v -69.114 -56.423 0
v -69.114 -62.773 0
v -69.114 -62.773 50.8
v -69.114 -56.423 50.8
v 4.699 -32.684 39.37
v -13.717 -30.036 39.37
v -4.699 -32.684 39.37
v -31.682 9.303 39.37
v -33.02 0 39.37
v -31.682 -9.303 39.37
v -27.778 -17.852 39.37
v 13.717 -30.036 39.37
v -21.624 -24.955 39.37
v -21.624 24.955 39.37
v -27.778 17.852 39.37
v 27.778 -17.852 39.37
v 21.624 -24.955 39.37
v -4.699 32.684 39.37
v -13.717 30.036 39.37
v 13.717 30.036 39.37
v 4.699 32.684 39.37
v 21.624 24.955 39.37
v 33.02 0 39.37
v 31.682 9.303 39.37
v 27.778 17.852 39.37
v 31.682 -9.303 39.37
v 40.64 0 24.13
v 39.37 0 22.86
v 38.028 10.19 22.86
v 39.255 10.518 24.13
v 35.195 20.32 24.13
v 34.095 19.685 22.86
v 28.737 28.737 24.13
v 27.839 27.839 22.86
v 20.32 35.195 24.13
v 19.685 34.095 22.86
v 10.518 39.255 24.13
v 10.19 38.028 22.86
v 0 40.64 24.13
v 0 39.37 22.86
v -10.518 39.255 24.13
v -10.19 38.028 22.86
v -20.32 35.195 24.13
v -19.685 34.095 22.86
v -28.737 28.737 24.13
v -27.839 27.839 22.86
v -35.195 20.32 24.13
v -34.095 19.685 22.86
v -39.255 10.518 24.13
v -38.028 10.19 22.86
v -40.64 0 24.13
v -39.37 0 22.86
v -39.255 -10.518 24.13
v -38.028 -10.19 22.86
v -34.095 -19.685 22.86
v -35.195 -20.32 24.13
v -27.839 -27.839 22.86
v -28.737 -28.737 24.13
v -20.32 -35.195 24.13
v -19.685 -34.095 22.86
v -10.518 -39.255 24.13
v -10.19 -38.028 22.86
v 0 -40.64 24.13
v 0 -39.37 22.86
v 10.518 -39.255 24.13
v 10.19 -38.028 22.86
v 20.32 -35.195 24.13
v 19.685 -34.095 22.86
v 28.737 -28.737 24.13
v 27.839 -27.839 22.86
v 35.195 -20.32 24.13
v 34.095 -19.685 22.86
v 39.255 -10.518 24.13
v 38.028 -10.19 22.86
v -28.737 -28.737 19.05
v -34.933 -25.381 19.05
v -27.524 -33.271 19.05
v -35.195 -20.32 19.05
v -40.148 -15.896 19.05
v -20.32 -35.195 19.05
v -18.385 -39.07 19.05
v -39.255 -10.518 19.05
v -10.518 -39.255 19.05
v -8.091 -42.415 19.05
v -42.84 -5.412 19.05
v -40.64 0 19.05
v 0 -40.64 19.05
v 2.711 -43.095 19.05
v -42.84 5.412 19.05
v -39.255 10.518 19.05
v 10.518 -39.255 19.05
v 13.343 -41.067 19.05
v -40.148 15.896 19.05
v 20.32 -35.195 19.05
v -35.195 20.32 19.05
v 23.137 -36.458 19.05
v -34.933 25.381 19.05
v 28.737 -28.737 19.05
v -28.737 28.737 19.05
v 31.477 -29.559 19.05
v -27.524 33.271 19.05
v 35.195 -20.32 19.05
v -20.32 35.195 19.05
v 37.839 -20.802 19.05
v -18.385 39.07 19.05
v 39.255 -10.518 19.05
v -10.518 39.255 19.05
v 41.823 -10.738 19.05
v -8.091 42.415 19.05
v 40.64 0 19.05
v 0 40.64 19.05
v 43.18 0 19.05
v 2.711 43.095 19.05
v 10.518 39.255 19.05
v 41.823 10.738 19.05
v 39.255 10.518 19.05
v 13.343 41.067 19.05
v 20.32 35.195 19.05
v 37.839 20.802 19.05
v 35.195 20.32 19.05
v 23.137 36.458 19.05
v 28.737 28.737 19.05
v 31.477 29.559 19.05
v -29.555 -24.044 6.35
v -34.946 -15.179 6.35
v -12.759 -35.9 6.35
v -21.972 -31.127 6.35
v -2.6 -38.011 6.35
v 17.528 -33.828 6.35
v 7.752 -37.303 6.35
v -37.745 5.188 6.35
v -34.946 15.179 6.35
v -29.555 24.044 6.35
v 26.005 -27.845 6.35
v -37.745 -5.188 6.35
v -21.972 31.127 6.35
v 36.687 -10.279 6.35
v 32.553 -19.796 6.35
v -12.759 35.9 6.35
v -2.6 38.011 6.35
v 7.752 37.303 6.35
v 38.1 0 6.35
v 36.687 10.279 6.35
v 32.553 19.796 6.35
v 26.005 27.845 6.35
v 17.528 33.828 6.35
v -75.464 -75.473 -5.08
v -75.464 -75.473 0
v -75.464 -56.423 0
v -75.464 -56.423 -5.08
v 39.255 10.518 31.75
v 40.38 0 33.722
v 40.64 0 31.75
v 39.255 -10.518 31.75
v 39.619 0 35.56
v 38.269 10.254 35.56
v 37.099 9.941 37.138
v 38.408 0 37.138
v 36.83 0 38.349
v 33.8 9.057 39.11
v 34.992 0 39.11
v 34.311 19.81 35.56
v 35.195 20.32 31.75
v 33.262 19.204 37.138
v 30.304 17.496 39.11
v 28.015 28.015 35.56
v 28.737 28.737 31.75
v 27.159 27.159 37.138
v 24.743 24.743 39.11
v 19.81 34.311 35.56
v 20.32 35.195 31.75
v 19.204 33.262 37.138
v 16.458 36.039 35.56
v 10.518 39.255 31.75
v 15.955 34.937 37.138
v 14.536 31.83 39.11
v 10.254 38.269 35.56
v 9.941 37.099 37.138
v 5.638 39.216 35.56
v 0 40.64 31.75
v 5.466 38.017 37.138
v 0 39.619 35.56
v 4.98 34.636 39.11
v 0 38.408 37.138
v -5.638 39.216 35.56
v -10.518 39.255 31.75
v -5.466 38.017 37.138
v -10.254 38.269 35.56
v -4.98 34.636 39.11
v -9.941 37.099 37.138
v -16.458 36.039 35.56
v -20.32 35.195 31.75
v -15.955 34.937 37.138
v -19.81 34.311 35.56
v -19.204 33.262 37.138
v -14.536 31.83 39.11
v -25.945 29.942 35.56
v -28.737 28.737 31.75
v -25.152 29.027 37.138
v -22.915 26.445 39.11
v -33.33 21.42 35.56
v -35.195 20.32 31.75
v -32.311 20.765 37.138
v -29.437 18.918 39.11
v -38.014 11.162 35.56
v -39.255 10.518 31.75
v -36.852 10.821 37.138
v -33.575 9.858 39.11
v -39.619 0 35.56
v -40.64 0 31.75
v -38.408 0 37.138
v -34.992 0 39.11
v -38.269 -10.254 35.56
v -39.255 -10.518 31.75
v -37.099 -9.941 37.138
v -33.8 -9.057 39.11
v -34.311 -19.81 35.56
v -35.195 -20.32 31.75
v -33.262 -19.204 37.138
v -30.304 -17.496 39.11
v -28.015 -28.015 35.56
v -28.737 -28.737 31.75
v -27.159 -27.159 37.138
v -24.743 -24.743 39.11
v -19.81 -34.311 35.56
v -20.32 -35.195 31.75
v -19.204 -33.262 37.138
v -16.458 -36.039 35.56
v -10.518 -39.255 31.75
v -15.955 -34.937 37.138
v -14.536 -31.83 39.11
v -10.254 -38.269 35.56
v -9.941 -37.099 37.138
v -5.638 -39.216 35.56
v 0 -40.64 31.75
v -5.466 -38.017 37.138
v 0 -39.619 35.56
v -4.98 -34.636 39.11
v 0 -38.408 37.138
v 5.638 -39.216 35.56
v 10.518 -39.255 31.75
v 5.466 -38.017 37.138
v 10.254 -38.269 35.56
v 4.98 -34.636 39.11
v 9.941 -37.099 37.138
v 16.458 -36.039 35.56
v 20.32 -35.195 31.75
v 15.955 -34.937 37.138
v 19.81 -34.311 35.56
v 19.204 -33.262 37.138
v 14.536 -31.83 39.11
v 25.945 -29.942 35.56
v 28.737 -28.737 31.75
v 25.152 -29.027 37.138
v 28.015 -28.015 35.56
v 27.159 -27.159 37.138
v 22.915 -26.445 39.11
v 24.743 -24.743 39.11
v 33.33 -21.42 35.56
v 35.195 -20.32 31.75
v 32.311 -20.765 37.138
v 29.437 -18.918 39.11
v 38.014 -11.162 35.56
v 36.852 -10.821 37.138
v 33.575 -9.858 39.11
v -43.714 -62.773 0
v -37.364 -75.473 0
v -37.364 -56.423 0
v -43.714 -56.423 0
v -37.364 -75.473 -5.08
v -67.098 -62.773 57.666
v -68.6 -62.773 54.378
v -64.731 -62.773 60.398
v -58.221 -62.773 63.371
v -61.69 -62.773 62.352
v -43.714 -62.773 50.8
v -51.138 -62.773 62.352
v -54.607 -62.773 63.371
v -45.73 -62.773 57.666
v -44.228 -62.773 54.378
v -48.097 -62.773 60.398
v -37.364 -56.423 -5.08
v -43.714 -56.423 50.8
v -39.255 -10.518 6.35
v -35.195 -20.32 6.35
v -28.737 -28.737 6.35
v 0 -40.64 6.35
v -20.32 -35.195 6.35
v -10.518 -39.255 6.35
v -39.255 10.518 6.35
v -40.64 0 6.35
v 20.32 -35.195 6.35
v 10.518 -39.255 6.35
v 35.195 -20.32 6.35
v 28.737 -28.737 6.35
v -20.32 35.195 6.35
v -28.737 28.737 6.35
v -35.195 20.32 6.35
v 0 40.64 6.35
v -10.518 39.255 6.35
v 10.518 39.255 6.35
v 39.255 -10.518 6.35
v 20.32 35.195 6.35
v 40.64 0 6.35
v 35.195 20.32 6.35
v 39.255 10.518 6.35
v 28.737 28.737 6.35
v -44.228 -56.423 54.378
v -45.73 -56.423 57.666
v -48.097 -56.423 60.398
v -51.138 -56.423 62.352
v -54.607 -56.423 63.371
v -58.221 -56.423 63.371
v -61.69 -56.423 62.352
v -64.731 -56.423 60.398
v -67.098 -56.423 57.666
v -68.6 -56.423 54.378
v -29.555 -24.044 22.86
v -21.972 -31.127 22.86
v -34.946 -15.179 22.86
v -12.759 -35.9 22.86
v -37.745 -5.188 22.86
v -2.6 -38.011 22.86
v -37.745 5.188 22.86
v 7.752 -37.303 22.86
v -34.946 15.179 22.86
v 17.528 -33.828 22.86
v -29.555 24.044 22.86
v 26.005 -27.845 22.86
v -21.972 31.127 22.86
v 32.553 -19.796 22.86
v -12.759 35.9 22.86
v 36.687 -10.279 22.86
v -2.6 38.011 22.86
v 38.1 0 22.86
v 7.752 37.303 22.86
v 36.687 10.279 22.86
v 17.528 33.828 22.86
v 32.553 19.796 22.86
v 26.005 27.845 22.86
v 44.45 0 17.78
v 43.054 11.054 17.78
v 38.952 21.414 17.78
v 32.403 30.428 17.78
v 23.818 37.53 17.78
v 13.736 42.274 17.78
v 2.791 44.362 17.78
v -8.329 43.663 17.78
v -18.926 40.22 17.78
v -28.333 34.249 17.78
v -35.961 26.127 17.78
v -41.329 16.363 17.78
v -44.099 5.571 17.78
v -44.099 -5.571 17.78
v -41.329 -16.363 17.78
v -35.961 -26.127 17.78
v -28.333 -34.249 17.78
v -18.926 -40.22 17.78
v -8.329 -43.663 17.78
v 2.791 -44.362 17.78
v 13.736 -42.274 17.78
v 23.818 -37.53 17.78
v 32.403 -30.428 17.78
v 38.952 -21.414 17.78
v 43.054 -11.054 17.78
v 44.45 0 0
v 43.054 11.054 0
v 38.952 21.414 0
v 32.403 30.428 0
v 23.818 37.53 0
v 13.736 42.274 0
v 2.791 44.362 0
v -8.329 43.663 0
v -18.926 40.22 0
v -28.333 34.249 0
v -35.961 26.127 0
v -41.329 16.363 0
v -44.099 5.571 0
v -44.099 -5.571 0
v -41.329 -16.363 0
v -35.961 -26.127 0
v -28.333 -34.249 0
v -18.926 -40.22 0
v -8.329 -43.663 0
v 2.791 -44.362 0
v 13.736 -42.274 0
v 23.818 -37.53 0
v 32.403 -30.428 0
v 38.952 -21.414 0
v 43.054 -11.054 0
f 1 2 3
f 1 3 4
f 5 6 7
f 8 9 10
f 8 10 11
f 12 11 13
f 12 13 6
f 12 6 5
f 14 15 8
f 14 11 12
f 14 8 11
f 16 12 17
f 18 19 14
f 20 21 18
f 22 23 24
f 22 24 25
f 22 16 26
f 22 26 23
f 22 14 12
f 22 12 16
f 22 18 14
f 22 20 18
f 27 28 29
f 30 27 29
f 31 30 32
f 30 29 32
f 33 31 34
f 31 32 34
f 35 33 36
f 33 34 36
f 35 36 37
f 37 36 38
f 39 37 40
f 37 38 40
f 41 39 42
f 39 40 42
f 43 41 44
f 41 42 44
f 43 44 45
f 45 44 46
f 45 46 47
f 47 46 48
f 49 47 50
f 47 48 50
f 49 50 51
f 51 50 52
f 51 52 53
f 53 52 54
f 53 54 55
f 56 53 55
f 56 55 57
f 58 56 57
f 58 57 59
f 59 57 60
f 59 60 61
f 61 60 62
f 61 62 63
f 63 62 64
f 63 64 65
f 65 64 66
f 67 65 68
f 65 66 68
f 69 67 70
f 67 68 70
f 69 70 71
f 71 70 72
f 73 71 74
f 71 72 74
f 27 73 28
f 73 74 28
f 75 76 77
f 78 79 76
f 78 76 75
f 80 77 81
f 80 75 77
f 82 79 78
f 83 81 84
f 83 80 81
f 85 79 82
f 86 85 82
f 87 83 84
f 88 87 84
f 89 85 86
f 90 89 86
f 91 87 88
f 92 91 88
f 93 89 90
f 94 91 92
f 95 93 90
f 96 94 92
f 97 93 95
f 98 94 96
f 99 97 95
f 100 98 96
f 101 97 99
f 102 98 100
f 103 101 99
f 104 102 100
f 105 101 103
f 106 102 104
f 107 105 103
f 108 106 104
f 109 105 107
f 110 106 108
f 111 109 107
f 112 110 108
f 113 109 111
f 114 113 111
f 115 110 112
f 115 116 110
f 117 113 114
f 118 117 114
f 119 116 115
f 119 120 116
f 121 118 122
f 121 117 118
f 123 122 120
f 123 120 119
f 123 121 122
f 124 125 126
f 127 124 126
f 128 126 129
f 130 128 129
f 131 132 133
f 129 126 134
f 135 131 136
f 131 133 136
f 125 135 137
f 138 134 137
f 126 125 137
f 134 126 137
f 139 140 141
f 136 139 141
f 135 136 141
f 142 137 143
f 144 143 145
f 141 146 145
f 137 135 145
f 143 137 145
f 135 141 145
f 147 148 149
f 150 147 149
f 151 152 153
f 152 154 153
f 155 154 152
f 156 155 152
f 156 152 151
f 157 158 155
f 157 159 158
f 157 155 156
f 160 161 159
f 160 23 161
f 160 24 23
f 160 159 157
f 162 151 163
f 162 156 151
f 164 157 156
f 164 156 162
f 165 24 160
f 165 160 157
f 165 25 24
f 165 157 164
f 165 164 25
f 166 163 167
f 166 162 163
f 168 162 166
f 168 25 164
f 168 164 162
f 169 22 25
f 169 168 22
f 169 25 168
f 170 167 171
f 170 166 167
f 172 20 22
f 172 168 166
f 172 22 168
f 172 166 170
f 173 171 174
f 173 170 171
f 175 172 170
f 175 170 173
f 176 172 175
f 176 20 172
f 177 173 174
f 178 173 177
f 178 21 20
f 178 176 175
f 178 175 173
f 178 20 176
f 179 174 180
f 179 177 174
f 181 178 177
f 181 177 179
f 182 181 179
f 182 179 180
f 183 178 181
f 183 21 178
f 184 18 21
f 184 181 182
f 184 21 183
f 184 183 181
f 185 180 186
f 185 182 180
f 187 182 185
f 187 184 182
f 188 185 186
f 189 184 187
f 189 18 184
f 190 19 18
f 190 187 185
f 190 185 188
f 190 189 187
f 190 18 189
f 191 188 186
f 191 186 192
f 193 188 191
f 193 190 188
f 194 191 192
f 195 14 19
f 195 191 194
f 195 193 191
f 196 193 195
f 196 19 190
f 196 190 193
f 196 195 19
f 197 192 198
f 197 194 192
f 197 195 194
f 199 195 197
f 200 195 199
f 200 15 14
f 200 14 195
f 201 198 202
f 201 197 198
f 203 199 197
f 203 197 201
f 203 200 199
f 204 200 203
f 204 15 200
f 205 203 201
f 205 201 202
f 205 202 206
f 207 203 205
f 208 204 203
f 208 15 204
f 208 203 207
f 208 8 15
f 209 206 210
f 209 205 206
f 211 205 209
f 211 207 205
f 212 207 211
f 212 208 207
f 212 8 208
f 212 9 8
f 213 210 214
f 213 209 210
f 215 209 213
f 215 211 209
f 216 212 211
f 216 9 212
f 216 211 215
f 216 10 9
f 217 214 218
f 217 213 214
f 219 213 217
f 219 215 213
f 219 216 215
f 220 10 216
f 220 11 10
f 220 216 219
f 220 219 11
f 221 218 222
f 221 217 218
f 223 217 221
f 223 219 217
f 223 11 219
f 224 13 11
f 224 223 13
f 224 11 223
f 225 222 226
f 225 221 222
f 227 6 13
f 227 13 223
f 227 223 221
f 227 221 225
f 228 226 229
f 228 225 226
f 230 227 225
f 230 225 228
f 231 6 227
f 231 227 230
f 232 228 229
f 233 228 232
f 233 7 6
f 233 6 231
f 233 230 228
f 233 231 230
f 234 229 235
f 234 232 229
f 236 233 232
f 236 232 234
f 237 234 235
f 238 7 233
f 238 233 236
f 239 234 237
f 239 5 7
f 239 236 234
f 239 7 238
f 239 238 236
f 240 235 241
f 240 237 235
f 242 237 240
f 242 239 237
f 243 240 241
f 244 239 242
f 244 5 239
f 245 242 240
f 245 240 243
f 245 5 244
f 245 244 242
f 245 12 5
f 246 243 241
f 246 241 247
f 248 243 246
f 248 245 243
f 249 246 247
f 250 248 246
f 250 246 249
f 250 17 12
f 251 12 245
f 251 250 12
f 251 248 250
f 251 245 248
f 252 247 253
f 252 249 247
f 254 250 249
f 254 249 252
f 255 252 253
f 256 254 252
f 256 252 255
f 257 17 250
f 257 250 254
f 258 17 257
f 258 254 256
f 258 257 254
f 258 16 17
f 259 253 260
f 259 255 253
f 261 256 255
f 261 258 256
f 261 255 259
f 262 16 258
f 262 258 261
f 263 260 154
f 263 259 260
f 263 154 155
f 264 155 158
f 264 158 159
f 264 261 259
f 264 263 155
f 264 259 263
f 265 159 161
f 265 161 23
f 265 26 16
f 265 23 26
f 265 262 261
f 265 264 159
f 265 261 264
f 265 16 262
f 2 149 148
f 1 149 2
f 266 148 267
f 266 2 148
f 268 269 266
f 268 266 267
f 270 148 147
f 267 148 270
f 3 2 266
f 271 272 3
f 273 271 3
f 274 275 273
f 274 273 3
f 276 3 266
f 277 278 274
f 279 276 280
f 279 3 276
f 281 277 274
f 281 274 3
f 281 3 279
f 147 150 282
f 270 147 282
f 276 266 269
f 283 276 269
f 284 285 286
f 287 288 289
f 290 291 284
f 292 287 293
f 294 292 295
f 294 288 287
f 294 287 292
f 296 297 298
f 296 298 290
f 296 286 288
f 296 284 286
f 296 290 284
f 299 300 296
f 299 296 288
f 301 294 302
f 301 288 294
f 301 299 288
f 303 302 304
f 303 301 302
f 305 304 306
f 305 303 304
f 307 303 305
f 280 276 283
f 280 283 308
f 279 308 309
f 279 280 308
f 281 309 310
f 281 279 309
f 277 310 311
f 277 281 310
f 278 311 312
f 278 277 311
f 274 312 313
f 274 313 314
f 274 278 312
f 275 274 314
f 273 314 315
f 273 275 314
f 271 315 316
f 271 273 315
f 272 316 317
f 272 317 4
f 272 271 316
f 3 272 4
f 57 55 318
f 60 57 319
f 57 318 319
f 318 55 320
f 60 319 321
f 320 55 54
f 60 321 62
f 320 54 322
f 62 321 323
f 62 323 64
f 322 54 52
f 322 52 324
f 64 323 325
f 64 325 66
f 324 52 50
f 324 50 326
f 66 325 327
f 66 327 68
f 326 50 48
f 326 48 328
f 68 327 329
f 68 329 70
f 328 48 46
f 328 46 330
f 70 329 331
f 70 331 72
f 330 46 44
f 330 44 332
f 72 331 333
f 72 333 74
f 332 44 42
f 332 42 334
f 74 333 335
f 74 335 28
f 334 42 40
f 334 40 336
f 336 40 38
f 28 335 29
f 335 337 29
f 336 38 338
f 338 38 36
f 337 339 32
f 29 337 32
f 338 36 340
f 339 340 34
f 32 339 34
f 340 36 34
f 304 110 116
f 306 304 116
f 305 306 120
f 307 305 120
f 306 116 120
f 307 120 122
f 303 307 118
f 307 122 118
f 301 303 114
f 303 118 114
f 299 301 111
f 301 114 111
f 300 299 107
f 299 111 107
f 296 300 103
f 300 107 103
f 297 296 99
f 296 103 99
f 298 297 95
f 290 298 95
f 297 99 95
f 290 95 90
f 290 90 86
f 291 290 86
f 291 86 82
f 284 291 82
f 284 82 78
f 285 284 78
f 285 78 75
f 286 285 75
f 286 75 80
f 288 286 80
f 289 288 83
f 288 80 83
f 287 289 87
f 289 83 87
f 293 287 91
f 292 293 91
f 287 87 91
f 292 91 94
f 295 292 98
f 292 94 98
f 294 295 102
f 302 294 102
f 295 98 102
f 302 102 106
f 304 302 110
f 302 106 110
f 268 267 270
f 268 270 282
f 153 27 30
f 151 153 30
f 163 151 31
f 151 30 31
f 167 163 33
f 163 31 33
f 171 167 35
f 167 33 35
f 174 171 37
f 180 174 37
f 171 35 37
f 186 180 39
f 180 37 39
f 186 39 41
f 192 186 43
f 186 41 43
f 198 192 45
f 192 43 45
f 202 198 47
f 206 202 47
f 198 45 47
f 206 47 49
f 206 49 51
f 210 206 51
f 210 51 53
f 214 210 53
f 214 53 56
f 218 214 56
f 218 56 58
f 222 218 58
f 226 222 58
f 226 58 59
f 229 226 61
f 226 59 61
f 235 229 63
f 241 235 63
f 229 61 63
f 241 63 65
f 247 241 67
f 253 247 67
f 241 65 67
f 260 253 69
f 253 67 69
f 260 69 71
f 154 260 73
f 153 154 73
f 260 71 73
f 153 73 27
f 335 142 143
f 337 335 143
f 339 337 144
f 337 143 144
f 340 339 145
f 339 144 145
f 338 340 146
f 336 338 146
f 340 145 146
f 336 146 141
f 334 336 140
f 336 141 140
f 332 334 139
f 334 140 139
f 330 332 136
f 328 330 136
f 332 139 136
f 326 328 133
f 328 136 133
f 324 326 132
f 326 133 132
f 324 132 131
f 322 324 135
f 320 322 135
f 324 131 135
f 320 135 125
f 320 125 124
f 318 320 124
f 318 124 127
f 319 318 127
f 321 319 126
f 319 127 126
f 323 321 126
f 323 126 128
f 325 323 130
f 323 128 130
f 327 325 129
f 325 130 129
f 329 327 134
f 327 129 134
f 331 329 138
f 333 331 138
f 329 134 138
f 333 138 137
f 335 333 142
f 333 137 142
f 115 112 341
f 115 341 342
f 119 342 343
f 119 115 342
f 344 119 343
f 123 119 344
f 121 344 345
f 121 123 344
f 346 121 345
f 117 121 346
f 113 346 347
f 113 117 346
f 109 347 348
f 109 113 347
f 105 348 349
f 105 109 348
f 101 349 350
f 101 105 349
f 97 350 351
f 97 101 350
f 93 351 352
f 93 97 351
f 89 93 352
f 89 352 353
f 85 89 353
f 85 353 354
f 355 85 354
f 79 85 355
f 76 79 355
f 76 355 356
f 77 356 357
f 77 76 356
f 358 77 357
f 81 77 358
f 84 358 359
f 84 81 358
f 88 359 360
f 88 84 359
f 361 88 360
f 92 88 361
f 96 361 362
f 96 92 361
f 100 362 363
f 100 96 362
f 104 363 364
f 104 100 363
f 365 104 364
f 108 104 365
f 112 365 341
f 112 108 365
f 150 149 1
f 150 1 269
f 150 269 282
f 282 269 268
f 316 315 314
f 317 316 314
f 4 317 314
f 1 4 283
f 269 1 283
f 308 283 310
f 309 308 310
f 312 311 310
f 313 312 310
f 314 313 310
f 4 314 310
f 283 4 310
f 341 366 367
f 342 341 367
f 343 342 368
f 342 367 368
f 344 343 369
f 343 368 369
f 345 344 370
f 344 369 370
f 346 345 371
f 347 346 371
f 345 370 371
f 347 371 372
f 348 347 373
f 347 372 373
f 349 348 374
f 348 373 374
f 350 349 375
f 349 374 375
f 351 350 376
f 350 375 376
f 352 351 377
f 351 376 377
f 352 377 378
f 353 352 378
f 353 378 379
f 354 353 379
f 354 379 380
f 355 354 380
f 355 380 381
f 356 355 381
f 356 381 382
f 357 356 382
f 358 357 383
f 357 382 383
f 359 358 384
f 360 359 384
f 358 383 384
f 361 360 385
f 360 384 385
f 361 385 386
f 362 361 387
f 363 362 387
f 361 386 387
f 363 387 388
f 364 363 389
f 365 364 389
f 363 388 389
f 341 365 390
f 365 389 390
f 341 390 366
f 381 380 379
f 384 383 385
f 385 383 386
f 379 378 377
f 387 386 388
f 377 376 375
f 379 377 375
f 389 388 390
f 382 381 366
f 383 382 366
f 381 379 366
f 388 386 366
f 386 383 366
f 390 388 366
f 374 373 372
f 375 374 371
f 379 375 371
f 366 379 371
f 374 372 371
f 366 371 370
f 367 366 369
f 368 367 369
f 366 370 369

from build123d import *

# Parameters (mm, degrees)
F0_R      = 44.45
F1_DEPTH  = 19.05
F2_R      = 40.64
F3_DEPTH  = 12.7
F4_R      = 38.1
F5_DEPTH  = 16.51
F6_R      = 40.64
F7_DEPTH  = 16.51
F8_R      = 7.62
F9_SIZE   = 1.27
F9_2_SIZE = 1.27
F10_W     = 38.1
F10_H     = 19.05
F11_DEPTH = 5.08
F12_W     = 25.4
F12_H     = 6.35
F13_DEPTH = 50.8
F15_DEPTH = 6.35


with BuildPart() as f1:
    # F0 (on Top) → F1 (new body)
    with BuildSketch(Plane.XY):
        Circle(F0_R)
    extrude(amount=F1_DEPTH)

    # F2 (on face) → F3 (cut)
    with BuildSketch(Plane.XY.offset(19.05)):
        Circle(F2_R)
    extrude(amount=-F3_DEPTH, mode=Mode.SUBTRACT)

    # F9
    f9_edges = [f1.edges().sort_by_distance(p)[0] for p in [
        (-44.45, 0, 19.05),
    ]]
    chamfer(f9_edges, length=F9_SIZE)


with BuildPart() as f5:
    # F4 (on face) → F5 (new body)
    with BuildSketch(Plane.XY.offset(6.35)):
        Circle(F4_R)
    extrude(amount=F5_DEPTH)

    # F6 (on face) → F7 (join)
    with BuildSketch(Plane.XY.offset(22.86)):
        Circle(F6_R)
    extrude(amount=F7_DEPTH)

    # F8
    f8_edges = [f5.edges().sort_by_distance(p)[0] for p in [
        (-40.64, 0, 39.37),
    ]]
    fillet(f8_edges, radius=F8_R)

    # F9#2
    f9_2_edges = [f5.edges().sort_by_distance(p)[0] for p in [
        (-40.64, 0, 22.86),
    ]]
    chamfer(f9_2_edges, length=F9_2_SIZE)


with BuildPart() as f11:
    # F10 (on Top) → F11 (new body)
    with BuildSketch(Plane.XY):
        with Locations((-56.4140207897, -65.9483543515)):
            Rectangle(F10_W, F10_H)
    extrude(amount=-F11_DEPTH)

    # F12 (on face) → F13 (join)
    with BuildSketch(Plane.XY):
        with Locations((-56.4140207897, -59.5983543515)):
            Rectangle(F12_W, F12_H)
    extrude(amount=F13_DEPTH)

    # F14 (on face) → F15 (join)
    with BuildSketch(Plane.XZ.offset(62.7733543515)):
        with BuildLine():
            Line((-69.1140207897, 50.8), (-43.7140207897, 50.8))
            ThreePointArc((-43.7140207897, 50.8), (-56.4140207897, 63.5), (-69.1140207897, 50.8))
        make_face()
    extrude(amount=-F15_DEPTH)


solid = Compound([f1.part, f5.part, f11.part])
